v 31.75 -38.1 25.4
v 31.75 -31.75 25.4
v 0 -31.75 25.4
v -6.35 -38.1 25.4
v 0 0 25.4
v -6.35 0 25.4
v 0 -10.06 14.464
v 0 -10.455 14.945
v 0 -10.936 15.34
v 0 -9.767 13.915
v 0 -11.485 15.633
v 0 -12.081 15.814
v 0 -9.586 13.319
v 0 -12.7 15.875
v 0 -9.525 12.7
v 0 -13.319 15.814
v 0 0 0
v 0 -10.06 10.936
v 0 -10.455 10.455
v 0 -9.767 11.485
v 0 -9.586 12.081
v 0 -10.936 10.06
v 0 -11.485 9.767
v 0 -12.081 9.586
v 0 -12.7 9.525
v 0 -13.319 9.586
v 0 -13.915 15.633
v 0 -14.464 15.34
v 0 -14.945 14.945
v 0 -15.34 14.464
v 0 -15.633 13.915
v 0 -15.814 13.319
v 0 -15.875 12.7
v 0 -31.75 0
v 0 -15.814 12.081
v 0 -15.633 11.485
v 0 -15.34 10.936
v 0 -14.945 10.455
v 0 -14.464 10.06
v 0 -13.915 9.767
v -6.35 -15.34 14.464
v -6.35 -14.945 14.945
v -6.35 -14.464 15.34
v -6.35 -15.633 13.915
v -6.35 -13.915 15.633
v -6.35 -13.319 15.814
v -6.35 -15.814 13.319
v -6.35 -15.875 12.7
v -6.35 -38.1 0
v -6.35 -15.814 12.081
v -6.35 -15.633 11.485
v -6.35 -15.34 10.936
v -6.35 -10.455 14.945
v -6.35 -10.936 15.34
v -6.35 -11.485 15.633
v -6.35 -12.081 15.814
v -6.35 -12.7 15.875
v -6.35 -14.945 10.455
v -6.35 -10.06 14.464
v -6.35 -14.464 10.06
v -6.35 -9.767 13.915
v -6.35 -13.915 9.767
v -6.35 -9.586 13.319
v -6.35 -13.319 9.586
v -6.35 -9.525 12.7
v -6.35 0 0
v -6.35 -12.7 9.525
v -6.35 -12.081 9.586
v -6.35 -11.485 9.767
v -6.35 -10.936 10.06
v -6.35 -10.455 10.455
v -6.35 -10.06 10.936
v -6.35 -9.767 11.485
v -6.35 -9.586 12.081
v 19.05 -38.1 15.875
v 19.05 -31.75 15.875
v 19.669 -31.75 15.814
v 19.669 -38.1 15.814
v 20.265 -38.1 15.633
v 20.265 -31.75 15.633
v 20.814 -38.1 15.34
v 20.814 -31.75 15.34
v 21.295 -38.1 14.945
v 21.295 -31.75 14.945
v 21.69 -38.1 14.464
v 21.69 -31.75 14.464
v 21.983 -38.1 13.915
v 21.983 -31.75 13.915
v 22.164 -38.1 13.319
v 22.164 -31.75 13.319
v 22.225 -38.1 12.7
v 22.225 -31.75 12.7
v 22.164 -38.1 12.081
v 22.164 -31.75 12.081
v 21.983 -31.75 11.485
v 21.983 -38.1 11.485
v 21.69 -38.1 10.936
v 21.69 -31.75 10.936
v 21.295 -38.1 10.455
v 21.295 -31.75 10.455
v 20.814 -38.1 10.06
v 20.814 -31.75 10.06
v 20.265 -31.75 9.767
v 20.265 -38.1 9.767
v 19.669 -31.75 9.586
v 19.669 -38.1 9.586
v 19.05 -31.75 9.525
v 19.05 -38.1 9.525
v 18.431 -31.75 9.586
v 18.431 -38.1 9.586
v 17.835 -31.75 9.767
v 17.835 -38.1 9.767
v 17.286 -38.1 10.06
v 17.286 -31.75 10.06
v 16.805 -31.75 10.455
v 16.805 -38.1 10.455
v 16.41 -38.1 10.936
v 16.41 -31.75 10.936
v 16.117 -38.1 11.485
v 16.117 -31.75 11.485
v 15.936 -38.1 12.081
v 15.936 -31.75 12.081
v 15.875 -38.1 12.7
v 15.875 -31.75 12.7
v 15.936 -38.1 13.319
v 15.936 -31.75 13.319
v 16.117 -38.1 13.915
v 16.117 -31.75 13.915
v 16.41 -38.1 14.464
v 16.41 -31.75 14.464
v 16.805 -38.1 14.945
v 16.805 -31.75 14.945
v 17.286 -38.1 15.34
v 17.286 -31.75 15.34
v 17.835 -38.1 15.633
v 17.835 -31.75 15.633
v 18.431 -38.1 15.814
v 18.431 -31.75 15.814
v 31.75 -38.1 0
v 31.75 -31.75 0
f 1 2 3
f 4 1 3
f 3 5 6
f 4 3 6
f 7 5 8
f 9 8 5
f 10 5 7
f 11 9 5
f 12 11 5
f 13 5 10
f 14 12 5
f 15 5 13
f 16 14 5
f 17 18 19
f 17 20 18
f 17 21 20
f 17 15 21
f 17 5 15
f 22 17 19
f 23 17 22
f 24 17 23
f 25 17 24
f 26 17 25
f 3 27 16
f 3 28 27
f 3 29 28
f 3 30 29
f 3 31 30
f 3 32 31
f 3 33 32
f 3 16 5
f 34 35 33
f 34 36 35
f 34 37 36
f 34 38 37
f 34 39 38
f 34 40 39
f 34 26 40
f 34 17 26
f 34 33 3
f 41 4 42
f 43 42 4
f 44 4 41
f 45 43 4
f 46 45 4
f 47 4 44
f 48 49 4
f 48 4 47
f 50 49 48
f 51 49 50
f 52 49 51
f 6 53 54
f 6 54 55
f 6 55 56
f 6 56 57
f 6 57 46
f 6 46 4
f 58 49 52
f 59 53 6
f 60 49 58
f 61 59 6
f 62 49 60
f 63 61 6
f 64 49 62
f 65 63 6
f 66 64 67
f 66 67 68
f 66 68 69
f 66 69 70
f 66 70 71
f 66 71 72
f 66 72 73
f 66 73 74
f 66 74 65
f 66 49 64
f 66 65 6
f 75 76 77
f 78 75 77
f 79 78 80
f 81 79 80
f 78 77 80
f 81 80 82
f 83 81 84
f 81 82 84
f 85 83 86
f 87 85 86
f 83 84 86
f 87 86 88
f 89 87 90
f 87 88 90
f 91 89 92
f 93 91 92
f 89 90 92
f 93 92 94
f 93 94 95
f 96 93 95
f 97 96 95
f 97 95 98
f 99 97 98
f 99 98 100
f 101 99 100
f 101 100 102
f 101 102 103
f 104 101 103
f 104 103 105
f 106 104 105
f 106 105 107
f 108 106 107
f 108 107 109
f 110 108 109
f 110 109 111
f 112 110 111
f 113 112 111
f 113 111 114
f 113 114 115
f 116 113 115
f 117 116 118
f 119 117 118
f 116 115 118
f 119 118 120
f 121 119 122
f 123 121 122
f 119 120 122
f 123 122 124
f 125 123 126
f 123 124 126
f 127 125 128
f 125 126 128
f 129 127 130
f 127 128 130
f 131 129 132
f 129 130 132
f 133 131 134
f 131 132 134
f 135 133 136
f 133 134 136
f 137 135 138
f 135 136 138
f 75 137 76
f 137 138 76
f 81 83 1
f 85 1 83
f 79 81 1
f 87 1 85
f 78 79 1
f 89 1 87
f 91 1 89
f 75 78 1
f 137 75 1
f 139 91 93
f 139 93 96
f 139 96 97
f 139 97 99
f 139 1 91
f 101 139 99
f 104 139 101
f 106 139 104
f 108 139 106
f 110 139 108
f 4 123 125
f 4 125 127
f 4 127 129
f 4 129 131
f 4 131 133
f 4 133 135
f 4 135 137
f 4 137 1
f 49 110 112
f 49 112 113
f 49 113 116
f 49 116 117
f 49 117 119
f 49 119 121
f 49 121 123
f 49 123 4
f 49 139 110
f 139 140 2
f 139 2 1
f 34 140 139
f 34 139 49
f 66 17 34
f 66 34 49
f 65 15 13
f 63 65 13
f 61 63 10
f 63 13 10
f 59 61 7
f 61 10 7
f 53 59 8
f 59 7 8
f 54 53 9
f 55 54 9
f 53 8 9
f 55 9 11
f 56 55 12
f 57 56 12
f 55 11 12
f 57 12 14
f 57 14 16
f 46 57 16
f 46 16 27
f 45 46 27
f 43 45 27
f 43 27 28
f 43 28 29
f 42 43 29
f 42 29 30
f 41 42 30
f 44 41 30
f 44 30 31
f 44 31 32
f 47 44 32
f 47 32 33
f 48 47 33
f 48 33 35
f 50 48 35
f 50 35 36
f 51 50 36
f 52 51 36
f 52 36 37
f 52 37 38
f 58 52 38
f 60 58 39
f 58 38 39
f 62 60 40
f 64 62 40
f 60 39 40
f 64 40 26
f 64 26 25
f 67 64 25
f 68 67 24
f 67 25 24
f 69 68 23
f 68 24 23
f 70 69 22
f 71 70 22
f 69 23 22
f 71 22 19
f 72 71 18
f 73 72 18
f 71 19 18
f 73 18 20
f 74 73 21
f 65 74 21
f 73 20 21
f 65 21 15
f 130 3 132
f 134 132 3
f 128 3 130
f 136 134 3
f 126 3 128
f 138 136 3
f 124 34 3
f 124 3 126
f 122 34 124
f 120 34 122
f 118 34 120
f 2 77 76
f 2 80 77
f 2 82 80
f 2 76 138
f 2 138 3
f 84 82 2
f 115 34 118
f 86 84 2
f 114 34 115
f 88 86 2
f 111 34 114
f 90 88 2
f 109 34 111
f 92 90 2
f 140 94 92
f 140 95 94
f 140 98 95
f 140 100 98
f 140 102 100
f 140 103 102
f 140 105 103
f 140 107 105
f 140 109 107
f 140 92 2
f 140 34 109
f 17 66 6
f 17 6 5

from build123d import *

# Parameters (mm, degrees)
BOSS_EXTRUDE1_DEPTH = 25.4
CUT_EXTRUDE1_REACH  = 57.721
SKETCH2_R           = 3.175
CUT_EXTRUDE2_REACH  = 53.588
SKETCH3_R           = 3.175


with BuildPart() as part:
    # Sketch1 → Boss-Extrude1 (new body)
    with BuildSketch(Plane.XY):
        Polygon((0, 0), (0, -31.75), (31.75, -31.75), (31.75, -38.1), (-6.35, -38.1), (-6.35, 0), align=None)
    extrude(amount=BOSS_EXTRUDE1_DEPTH)

    # Sketch2 → Cut-Extrude1 (cut, up to next)
    with BuildSketch(Plane(origin=(0, 0, 0), x_dir=(0, 0, -1), z_dir=(1, 0, 0)), mode=Mode.PRIVATE) as cut_extrude1_sk1:
        with Locations(Location((-12.7, -12.7, 0), (0, 0, 90))):
            Circle(SKETCH2_R)
    cut_extrude1_tool1 = extrude(cut_extrude1_sk1.sketch, amount=-CUT_EXTRUDE1_REACH, mode=Mode.PRIVATE) & part.part
    add(cut_extrude1_tool1.solids().sort_by_distance((0, -12.7, 12.7))[0], mode=Mode.SUBTRACT)

    # Sketch3 → Cut-Extrude2 (cut, up to next)
    with BuildSketch(Plane(origin=(0, -31.75, 0), x_dir=(1, 0, 0), z_dir=(0, 1, 0)), mode=Mode.PRIVATE) as cut_extrude2_sk1:
        with Locations(Location((19.05, -12.7, 0), (0, 0, 270))):
            Circle(SKETCH3_R)
    cut_extrude2_tool1 = extrude(cut_extrude2_sk1.sketch, amount=-CUT_EXTRUDE2_REACH, mode=Mode.PRIVATE) & part.part
    add(cut_extrude2_tool1.solids().sort_by_distance((19.05, -31.75, 12.7))[0], mode=Mode.SUBTRACT)


solid = part.part
